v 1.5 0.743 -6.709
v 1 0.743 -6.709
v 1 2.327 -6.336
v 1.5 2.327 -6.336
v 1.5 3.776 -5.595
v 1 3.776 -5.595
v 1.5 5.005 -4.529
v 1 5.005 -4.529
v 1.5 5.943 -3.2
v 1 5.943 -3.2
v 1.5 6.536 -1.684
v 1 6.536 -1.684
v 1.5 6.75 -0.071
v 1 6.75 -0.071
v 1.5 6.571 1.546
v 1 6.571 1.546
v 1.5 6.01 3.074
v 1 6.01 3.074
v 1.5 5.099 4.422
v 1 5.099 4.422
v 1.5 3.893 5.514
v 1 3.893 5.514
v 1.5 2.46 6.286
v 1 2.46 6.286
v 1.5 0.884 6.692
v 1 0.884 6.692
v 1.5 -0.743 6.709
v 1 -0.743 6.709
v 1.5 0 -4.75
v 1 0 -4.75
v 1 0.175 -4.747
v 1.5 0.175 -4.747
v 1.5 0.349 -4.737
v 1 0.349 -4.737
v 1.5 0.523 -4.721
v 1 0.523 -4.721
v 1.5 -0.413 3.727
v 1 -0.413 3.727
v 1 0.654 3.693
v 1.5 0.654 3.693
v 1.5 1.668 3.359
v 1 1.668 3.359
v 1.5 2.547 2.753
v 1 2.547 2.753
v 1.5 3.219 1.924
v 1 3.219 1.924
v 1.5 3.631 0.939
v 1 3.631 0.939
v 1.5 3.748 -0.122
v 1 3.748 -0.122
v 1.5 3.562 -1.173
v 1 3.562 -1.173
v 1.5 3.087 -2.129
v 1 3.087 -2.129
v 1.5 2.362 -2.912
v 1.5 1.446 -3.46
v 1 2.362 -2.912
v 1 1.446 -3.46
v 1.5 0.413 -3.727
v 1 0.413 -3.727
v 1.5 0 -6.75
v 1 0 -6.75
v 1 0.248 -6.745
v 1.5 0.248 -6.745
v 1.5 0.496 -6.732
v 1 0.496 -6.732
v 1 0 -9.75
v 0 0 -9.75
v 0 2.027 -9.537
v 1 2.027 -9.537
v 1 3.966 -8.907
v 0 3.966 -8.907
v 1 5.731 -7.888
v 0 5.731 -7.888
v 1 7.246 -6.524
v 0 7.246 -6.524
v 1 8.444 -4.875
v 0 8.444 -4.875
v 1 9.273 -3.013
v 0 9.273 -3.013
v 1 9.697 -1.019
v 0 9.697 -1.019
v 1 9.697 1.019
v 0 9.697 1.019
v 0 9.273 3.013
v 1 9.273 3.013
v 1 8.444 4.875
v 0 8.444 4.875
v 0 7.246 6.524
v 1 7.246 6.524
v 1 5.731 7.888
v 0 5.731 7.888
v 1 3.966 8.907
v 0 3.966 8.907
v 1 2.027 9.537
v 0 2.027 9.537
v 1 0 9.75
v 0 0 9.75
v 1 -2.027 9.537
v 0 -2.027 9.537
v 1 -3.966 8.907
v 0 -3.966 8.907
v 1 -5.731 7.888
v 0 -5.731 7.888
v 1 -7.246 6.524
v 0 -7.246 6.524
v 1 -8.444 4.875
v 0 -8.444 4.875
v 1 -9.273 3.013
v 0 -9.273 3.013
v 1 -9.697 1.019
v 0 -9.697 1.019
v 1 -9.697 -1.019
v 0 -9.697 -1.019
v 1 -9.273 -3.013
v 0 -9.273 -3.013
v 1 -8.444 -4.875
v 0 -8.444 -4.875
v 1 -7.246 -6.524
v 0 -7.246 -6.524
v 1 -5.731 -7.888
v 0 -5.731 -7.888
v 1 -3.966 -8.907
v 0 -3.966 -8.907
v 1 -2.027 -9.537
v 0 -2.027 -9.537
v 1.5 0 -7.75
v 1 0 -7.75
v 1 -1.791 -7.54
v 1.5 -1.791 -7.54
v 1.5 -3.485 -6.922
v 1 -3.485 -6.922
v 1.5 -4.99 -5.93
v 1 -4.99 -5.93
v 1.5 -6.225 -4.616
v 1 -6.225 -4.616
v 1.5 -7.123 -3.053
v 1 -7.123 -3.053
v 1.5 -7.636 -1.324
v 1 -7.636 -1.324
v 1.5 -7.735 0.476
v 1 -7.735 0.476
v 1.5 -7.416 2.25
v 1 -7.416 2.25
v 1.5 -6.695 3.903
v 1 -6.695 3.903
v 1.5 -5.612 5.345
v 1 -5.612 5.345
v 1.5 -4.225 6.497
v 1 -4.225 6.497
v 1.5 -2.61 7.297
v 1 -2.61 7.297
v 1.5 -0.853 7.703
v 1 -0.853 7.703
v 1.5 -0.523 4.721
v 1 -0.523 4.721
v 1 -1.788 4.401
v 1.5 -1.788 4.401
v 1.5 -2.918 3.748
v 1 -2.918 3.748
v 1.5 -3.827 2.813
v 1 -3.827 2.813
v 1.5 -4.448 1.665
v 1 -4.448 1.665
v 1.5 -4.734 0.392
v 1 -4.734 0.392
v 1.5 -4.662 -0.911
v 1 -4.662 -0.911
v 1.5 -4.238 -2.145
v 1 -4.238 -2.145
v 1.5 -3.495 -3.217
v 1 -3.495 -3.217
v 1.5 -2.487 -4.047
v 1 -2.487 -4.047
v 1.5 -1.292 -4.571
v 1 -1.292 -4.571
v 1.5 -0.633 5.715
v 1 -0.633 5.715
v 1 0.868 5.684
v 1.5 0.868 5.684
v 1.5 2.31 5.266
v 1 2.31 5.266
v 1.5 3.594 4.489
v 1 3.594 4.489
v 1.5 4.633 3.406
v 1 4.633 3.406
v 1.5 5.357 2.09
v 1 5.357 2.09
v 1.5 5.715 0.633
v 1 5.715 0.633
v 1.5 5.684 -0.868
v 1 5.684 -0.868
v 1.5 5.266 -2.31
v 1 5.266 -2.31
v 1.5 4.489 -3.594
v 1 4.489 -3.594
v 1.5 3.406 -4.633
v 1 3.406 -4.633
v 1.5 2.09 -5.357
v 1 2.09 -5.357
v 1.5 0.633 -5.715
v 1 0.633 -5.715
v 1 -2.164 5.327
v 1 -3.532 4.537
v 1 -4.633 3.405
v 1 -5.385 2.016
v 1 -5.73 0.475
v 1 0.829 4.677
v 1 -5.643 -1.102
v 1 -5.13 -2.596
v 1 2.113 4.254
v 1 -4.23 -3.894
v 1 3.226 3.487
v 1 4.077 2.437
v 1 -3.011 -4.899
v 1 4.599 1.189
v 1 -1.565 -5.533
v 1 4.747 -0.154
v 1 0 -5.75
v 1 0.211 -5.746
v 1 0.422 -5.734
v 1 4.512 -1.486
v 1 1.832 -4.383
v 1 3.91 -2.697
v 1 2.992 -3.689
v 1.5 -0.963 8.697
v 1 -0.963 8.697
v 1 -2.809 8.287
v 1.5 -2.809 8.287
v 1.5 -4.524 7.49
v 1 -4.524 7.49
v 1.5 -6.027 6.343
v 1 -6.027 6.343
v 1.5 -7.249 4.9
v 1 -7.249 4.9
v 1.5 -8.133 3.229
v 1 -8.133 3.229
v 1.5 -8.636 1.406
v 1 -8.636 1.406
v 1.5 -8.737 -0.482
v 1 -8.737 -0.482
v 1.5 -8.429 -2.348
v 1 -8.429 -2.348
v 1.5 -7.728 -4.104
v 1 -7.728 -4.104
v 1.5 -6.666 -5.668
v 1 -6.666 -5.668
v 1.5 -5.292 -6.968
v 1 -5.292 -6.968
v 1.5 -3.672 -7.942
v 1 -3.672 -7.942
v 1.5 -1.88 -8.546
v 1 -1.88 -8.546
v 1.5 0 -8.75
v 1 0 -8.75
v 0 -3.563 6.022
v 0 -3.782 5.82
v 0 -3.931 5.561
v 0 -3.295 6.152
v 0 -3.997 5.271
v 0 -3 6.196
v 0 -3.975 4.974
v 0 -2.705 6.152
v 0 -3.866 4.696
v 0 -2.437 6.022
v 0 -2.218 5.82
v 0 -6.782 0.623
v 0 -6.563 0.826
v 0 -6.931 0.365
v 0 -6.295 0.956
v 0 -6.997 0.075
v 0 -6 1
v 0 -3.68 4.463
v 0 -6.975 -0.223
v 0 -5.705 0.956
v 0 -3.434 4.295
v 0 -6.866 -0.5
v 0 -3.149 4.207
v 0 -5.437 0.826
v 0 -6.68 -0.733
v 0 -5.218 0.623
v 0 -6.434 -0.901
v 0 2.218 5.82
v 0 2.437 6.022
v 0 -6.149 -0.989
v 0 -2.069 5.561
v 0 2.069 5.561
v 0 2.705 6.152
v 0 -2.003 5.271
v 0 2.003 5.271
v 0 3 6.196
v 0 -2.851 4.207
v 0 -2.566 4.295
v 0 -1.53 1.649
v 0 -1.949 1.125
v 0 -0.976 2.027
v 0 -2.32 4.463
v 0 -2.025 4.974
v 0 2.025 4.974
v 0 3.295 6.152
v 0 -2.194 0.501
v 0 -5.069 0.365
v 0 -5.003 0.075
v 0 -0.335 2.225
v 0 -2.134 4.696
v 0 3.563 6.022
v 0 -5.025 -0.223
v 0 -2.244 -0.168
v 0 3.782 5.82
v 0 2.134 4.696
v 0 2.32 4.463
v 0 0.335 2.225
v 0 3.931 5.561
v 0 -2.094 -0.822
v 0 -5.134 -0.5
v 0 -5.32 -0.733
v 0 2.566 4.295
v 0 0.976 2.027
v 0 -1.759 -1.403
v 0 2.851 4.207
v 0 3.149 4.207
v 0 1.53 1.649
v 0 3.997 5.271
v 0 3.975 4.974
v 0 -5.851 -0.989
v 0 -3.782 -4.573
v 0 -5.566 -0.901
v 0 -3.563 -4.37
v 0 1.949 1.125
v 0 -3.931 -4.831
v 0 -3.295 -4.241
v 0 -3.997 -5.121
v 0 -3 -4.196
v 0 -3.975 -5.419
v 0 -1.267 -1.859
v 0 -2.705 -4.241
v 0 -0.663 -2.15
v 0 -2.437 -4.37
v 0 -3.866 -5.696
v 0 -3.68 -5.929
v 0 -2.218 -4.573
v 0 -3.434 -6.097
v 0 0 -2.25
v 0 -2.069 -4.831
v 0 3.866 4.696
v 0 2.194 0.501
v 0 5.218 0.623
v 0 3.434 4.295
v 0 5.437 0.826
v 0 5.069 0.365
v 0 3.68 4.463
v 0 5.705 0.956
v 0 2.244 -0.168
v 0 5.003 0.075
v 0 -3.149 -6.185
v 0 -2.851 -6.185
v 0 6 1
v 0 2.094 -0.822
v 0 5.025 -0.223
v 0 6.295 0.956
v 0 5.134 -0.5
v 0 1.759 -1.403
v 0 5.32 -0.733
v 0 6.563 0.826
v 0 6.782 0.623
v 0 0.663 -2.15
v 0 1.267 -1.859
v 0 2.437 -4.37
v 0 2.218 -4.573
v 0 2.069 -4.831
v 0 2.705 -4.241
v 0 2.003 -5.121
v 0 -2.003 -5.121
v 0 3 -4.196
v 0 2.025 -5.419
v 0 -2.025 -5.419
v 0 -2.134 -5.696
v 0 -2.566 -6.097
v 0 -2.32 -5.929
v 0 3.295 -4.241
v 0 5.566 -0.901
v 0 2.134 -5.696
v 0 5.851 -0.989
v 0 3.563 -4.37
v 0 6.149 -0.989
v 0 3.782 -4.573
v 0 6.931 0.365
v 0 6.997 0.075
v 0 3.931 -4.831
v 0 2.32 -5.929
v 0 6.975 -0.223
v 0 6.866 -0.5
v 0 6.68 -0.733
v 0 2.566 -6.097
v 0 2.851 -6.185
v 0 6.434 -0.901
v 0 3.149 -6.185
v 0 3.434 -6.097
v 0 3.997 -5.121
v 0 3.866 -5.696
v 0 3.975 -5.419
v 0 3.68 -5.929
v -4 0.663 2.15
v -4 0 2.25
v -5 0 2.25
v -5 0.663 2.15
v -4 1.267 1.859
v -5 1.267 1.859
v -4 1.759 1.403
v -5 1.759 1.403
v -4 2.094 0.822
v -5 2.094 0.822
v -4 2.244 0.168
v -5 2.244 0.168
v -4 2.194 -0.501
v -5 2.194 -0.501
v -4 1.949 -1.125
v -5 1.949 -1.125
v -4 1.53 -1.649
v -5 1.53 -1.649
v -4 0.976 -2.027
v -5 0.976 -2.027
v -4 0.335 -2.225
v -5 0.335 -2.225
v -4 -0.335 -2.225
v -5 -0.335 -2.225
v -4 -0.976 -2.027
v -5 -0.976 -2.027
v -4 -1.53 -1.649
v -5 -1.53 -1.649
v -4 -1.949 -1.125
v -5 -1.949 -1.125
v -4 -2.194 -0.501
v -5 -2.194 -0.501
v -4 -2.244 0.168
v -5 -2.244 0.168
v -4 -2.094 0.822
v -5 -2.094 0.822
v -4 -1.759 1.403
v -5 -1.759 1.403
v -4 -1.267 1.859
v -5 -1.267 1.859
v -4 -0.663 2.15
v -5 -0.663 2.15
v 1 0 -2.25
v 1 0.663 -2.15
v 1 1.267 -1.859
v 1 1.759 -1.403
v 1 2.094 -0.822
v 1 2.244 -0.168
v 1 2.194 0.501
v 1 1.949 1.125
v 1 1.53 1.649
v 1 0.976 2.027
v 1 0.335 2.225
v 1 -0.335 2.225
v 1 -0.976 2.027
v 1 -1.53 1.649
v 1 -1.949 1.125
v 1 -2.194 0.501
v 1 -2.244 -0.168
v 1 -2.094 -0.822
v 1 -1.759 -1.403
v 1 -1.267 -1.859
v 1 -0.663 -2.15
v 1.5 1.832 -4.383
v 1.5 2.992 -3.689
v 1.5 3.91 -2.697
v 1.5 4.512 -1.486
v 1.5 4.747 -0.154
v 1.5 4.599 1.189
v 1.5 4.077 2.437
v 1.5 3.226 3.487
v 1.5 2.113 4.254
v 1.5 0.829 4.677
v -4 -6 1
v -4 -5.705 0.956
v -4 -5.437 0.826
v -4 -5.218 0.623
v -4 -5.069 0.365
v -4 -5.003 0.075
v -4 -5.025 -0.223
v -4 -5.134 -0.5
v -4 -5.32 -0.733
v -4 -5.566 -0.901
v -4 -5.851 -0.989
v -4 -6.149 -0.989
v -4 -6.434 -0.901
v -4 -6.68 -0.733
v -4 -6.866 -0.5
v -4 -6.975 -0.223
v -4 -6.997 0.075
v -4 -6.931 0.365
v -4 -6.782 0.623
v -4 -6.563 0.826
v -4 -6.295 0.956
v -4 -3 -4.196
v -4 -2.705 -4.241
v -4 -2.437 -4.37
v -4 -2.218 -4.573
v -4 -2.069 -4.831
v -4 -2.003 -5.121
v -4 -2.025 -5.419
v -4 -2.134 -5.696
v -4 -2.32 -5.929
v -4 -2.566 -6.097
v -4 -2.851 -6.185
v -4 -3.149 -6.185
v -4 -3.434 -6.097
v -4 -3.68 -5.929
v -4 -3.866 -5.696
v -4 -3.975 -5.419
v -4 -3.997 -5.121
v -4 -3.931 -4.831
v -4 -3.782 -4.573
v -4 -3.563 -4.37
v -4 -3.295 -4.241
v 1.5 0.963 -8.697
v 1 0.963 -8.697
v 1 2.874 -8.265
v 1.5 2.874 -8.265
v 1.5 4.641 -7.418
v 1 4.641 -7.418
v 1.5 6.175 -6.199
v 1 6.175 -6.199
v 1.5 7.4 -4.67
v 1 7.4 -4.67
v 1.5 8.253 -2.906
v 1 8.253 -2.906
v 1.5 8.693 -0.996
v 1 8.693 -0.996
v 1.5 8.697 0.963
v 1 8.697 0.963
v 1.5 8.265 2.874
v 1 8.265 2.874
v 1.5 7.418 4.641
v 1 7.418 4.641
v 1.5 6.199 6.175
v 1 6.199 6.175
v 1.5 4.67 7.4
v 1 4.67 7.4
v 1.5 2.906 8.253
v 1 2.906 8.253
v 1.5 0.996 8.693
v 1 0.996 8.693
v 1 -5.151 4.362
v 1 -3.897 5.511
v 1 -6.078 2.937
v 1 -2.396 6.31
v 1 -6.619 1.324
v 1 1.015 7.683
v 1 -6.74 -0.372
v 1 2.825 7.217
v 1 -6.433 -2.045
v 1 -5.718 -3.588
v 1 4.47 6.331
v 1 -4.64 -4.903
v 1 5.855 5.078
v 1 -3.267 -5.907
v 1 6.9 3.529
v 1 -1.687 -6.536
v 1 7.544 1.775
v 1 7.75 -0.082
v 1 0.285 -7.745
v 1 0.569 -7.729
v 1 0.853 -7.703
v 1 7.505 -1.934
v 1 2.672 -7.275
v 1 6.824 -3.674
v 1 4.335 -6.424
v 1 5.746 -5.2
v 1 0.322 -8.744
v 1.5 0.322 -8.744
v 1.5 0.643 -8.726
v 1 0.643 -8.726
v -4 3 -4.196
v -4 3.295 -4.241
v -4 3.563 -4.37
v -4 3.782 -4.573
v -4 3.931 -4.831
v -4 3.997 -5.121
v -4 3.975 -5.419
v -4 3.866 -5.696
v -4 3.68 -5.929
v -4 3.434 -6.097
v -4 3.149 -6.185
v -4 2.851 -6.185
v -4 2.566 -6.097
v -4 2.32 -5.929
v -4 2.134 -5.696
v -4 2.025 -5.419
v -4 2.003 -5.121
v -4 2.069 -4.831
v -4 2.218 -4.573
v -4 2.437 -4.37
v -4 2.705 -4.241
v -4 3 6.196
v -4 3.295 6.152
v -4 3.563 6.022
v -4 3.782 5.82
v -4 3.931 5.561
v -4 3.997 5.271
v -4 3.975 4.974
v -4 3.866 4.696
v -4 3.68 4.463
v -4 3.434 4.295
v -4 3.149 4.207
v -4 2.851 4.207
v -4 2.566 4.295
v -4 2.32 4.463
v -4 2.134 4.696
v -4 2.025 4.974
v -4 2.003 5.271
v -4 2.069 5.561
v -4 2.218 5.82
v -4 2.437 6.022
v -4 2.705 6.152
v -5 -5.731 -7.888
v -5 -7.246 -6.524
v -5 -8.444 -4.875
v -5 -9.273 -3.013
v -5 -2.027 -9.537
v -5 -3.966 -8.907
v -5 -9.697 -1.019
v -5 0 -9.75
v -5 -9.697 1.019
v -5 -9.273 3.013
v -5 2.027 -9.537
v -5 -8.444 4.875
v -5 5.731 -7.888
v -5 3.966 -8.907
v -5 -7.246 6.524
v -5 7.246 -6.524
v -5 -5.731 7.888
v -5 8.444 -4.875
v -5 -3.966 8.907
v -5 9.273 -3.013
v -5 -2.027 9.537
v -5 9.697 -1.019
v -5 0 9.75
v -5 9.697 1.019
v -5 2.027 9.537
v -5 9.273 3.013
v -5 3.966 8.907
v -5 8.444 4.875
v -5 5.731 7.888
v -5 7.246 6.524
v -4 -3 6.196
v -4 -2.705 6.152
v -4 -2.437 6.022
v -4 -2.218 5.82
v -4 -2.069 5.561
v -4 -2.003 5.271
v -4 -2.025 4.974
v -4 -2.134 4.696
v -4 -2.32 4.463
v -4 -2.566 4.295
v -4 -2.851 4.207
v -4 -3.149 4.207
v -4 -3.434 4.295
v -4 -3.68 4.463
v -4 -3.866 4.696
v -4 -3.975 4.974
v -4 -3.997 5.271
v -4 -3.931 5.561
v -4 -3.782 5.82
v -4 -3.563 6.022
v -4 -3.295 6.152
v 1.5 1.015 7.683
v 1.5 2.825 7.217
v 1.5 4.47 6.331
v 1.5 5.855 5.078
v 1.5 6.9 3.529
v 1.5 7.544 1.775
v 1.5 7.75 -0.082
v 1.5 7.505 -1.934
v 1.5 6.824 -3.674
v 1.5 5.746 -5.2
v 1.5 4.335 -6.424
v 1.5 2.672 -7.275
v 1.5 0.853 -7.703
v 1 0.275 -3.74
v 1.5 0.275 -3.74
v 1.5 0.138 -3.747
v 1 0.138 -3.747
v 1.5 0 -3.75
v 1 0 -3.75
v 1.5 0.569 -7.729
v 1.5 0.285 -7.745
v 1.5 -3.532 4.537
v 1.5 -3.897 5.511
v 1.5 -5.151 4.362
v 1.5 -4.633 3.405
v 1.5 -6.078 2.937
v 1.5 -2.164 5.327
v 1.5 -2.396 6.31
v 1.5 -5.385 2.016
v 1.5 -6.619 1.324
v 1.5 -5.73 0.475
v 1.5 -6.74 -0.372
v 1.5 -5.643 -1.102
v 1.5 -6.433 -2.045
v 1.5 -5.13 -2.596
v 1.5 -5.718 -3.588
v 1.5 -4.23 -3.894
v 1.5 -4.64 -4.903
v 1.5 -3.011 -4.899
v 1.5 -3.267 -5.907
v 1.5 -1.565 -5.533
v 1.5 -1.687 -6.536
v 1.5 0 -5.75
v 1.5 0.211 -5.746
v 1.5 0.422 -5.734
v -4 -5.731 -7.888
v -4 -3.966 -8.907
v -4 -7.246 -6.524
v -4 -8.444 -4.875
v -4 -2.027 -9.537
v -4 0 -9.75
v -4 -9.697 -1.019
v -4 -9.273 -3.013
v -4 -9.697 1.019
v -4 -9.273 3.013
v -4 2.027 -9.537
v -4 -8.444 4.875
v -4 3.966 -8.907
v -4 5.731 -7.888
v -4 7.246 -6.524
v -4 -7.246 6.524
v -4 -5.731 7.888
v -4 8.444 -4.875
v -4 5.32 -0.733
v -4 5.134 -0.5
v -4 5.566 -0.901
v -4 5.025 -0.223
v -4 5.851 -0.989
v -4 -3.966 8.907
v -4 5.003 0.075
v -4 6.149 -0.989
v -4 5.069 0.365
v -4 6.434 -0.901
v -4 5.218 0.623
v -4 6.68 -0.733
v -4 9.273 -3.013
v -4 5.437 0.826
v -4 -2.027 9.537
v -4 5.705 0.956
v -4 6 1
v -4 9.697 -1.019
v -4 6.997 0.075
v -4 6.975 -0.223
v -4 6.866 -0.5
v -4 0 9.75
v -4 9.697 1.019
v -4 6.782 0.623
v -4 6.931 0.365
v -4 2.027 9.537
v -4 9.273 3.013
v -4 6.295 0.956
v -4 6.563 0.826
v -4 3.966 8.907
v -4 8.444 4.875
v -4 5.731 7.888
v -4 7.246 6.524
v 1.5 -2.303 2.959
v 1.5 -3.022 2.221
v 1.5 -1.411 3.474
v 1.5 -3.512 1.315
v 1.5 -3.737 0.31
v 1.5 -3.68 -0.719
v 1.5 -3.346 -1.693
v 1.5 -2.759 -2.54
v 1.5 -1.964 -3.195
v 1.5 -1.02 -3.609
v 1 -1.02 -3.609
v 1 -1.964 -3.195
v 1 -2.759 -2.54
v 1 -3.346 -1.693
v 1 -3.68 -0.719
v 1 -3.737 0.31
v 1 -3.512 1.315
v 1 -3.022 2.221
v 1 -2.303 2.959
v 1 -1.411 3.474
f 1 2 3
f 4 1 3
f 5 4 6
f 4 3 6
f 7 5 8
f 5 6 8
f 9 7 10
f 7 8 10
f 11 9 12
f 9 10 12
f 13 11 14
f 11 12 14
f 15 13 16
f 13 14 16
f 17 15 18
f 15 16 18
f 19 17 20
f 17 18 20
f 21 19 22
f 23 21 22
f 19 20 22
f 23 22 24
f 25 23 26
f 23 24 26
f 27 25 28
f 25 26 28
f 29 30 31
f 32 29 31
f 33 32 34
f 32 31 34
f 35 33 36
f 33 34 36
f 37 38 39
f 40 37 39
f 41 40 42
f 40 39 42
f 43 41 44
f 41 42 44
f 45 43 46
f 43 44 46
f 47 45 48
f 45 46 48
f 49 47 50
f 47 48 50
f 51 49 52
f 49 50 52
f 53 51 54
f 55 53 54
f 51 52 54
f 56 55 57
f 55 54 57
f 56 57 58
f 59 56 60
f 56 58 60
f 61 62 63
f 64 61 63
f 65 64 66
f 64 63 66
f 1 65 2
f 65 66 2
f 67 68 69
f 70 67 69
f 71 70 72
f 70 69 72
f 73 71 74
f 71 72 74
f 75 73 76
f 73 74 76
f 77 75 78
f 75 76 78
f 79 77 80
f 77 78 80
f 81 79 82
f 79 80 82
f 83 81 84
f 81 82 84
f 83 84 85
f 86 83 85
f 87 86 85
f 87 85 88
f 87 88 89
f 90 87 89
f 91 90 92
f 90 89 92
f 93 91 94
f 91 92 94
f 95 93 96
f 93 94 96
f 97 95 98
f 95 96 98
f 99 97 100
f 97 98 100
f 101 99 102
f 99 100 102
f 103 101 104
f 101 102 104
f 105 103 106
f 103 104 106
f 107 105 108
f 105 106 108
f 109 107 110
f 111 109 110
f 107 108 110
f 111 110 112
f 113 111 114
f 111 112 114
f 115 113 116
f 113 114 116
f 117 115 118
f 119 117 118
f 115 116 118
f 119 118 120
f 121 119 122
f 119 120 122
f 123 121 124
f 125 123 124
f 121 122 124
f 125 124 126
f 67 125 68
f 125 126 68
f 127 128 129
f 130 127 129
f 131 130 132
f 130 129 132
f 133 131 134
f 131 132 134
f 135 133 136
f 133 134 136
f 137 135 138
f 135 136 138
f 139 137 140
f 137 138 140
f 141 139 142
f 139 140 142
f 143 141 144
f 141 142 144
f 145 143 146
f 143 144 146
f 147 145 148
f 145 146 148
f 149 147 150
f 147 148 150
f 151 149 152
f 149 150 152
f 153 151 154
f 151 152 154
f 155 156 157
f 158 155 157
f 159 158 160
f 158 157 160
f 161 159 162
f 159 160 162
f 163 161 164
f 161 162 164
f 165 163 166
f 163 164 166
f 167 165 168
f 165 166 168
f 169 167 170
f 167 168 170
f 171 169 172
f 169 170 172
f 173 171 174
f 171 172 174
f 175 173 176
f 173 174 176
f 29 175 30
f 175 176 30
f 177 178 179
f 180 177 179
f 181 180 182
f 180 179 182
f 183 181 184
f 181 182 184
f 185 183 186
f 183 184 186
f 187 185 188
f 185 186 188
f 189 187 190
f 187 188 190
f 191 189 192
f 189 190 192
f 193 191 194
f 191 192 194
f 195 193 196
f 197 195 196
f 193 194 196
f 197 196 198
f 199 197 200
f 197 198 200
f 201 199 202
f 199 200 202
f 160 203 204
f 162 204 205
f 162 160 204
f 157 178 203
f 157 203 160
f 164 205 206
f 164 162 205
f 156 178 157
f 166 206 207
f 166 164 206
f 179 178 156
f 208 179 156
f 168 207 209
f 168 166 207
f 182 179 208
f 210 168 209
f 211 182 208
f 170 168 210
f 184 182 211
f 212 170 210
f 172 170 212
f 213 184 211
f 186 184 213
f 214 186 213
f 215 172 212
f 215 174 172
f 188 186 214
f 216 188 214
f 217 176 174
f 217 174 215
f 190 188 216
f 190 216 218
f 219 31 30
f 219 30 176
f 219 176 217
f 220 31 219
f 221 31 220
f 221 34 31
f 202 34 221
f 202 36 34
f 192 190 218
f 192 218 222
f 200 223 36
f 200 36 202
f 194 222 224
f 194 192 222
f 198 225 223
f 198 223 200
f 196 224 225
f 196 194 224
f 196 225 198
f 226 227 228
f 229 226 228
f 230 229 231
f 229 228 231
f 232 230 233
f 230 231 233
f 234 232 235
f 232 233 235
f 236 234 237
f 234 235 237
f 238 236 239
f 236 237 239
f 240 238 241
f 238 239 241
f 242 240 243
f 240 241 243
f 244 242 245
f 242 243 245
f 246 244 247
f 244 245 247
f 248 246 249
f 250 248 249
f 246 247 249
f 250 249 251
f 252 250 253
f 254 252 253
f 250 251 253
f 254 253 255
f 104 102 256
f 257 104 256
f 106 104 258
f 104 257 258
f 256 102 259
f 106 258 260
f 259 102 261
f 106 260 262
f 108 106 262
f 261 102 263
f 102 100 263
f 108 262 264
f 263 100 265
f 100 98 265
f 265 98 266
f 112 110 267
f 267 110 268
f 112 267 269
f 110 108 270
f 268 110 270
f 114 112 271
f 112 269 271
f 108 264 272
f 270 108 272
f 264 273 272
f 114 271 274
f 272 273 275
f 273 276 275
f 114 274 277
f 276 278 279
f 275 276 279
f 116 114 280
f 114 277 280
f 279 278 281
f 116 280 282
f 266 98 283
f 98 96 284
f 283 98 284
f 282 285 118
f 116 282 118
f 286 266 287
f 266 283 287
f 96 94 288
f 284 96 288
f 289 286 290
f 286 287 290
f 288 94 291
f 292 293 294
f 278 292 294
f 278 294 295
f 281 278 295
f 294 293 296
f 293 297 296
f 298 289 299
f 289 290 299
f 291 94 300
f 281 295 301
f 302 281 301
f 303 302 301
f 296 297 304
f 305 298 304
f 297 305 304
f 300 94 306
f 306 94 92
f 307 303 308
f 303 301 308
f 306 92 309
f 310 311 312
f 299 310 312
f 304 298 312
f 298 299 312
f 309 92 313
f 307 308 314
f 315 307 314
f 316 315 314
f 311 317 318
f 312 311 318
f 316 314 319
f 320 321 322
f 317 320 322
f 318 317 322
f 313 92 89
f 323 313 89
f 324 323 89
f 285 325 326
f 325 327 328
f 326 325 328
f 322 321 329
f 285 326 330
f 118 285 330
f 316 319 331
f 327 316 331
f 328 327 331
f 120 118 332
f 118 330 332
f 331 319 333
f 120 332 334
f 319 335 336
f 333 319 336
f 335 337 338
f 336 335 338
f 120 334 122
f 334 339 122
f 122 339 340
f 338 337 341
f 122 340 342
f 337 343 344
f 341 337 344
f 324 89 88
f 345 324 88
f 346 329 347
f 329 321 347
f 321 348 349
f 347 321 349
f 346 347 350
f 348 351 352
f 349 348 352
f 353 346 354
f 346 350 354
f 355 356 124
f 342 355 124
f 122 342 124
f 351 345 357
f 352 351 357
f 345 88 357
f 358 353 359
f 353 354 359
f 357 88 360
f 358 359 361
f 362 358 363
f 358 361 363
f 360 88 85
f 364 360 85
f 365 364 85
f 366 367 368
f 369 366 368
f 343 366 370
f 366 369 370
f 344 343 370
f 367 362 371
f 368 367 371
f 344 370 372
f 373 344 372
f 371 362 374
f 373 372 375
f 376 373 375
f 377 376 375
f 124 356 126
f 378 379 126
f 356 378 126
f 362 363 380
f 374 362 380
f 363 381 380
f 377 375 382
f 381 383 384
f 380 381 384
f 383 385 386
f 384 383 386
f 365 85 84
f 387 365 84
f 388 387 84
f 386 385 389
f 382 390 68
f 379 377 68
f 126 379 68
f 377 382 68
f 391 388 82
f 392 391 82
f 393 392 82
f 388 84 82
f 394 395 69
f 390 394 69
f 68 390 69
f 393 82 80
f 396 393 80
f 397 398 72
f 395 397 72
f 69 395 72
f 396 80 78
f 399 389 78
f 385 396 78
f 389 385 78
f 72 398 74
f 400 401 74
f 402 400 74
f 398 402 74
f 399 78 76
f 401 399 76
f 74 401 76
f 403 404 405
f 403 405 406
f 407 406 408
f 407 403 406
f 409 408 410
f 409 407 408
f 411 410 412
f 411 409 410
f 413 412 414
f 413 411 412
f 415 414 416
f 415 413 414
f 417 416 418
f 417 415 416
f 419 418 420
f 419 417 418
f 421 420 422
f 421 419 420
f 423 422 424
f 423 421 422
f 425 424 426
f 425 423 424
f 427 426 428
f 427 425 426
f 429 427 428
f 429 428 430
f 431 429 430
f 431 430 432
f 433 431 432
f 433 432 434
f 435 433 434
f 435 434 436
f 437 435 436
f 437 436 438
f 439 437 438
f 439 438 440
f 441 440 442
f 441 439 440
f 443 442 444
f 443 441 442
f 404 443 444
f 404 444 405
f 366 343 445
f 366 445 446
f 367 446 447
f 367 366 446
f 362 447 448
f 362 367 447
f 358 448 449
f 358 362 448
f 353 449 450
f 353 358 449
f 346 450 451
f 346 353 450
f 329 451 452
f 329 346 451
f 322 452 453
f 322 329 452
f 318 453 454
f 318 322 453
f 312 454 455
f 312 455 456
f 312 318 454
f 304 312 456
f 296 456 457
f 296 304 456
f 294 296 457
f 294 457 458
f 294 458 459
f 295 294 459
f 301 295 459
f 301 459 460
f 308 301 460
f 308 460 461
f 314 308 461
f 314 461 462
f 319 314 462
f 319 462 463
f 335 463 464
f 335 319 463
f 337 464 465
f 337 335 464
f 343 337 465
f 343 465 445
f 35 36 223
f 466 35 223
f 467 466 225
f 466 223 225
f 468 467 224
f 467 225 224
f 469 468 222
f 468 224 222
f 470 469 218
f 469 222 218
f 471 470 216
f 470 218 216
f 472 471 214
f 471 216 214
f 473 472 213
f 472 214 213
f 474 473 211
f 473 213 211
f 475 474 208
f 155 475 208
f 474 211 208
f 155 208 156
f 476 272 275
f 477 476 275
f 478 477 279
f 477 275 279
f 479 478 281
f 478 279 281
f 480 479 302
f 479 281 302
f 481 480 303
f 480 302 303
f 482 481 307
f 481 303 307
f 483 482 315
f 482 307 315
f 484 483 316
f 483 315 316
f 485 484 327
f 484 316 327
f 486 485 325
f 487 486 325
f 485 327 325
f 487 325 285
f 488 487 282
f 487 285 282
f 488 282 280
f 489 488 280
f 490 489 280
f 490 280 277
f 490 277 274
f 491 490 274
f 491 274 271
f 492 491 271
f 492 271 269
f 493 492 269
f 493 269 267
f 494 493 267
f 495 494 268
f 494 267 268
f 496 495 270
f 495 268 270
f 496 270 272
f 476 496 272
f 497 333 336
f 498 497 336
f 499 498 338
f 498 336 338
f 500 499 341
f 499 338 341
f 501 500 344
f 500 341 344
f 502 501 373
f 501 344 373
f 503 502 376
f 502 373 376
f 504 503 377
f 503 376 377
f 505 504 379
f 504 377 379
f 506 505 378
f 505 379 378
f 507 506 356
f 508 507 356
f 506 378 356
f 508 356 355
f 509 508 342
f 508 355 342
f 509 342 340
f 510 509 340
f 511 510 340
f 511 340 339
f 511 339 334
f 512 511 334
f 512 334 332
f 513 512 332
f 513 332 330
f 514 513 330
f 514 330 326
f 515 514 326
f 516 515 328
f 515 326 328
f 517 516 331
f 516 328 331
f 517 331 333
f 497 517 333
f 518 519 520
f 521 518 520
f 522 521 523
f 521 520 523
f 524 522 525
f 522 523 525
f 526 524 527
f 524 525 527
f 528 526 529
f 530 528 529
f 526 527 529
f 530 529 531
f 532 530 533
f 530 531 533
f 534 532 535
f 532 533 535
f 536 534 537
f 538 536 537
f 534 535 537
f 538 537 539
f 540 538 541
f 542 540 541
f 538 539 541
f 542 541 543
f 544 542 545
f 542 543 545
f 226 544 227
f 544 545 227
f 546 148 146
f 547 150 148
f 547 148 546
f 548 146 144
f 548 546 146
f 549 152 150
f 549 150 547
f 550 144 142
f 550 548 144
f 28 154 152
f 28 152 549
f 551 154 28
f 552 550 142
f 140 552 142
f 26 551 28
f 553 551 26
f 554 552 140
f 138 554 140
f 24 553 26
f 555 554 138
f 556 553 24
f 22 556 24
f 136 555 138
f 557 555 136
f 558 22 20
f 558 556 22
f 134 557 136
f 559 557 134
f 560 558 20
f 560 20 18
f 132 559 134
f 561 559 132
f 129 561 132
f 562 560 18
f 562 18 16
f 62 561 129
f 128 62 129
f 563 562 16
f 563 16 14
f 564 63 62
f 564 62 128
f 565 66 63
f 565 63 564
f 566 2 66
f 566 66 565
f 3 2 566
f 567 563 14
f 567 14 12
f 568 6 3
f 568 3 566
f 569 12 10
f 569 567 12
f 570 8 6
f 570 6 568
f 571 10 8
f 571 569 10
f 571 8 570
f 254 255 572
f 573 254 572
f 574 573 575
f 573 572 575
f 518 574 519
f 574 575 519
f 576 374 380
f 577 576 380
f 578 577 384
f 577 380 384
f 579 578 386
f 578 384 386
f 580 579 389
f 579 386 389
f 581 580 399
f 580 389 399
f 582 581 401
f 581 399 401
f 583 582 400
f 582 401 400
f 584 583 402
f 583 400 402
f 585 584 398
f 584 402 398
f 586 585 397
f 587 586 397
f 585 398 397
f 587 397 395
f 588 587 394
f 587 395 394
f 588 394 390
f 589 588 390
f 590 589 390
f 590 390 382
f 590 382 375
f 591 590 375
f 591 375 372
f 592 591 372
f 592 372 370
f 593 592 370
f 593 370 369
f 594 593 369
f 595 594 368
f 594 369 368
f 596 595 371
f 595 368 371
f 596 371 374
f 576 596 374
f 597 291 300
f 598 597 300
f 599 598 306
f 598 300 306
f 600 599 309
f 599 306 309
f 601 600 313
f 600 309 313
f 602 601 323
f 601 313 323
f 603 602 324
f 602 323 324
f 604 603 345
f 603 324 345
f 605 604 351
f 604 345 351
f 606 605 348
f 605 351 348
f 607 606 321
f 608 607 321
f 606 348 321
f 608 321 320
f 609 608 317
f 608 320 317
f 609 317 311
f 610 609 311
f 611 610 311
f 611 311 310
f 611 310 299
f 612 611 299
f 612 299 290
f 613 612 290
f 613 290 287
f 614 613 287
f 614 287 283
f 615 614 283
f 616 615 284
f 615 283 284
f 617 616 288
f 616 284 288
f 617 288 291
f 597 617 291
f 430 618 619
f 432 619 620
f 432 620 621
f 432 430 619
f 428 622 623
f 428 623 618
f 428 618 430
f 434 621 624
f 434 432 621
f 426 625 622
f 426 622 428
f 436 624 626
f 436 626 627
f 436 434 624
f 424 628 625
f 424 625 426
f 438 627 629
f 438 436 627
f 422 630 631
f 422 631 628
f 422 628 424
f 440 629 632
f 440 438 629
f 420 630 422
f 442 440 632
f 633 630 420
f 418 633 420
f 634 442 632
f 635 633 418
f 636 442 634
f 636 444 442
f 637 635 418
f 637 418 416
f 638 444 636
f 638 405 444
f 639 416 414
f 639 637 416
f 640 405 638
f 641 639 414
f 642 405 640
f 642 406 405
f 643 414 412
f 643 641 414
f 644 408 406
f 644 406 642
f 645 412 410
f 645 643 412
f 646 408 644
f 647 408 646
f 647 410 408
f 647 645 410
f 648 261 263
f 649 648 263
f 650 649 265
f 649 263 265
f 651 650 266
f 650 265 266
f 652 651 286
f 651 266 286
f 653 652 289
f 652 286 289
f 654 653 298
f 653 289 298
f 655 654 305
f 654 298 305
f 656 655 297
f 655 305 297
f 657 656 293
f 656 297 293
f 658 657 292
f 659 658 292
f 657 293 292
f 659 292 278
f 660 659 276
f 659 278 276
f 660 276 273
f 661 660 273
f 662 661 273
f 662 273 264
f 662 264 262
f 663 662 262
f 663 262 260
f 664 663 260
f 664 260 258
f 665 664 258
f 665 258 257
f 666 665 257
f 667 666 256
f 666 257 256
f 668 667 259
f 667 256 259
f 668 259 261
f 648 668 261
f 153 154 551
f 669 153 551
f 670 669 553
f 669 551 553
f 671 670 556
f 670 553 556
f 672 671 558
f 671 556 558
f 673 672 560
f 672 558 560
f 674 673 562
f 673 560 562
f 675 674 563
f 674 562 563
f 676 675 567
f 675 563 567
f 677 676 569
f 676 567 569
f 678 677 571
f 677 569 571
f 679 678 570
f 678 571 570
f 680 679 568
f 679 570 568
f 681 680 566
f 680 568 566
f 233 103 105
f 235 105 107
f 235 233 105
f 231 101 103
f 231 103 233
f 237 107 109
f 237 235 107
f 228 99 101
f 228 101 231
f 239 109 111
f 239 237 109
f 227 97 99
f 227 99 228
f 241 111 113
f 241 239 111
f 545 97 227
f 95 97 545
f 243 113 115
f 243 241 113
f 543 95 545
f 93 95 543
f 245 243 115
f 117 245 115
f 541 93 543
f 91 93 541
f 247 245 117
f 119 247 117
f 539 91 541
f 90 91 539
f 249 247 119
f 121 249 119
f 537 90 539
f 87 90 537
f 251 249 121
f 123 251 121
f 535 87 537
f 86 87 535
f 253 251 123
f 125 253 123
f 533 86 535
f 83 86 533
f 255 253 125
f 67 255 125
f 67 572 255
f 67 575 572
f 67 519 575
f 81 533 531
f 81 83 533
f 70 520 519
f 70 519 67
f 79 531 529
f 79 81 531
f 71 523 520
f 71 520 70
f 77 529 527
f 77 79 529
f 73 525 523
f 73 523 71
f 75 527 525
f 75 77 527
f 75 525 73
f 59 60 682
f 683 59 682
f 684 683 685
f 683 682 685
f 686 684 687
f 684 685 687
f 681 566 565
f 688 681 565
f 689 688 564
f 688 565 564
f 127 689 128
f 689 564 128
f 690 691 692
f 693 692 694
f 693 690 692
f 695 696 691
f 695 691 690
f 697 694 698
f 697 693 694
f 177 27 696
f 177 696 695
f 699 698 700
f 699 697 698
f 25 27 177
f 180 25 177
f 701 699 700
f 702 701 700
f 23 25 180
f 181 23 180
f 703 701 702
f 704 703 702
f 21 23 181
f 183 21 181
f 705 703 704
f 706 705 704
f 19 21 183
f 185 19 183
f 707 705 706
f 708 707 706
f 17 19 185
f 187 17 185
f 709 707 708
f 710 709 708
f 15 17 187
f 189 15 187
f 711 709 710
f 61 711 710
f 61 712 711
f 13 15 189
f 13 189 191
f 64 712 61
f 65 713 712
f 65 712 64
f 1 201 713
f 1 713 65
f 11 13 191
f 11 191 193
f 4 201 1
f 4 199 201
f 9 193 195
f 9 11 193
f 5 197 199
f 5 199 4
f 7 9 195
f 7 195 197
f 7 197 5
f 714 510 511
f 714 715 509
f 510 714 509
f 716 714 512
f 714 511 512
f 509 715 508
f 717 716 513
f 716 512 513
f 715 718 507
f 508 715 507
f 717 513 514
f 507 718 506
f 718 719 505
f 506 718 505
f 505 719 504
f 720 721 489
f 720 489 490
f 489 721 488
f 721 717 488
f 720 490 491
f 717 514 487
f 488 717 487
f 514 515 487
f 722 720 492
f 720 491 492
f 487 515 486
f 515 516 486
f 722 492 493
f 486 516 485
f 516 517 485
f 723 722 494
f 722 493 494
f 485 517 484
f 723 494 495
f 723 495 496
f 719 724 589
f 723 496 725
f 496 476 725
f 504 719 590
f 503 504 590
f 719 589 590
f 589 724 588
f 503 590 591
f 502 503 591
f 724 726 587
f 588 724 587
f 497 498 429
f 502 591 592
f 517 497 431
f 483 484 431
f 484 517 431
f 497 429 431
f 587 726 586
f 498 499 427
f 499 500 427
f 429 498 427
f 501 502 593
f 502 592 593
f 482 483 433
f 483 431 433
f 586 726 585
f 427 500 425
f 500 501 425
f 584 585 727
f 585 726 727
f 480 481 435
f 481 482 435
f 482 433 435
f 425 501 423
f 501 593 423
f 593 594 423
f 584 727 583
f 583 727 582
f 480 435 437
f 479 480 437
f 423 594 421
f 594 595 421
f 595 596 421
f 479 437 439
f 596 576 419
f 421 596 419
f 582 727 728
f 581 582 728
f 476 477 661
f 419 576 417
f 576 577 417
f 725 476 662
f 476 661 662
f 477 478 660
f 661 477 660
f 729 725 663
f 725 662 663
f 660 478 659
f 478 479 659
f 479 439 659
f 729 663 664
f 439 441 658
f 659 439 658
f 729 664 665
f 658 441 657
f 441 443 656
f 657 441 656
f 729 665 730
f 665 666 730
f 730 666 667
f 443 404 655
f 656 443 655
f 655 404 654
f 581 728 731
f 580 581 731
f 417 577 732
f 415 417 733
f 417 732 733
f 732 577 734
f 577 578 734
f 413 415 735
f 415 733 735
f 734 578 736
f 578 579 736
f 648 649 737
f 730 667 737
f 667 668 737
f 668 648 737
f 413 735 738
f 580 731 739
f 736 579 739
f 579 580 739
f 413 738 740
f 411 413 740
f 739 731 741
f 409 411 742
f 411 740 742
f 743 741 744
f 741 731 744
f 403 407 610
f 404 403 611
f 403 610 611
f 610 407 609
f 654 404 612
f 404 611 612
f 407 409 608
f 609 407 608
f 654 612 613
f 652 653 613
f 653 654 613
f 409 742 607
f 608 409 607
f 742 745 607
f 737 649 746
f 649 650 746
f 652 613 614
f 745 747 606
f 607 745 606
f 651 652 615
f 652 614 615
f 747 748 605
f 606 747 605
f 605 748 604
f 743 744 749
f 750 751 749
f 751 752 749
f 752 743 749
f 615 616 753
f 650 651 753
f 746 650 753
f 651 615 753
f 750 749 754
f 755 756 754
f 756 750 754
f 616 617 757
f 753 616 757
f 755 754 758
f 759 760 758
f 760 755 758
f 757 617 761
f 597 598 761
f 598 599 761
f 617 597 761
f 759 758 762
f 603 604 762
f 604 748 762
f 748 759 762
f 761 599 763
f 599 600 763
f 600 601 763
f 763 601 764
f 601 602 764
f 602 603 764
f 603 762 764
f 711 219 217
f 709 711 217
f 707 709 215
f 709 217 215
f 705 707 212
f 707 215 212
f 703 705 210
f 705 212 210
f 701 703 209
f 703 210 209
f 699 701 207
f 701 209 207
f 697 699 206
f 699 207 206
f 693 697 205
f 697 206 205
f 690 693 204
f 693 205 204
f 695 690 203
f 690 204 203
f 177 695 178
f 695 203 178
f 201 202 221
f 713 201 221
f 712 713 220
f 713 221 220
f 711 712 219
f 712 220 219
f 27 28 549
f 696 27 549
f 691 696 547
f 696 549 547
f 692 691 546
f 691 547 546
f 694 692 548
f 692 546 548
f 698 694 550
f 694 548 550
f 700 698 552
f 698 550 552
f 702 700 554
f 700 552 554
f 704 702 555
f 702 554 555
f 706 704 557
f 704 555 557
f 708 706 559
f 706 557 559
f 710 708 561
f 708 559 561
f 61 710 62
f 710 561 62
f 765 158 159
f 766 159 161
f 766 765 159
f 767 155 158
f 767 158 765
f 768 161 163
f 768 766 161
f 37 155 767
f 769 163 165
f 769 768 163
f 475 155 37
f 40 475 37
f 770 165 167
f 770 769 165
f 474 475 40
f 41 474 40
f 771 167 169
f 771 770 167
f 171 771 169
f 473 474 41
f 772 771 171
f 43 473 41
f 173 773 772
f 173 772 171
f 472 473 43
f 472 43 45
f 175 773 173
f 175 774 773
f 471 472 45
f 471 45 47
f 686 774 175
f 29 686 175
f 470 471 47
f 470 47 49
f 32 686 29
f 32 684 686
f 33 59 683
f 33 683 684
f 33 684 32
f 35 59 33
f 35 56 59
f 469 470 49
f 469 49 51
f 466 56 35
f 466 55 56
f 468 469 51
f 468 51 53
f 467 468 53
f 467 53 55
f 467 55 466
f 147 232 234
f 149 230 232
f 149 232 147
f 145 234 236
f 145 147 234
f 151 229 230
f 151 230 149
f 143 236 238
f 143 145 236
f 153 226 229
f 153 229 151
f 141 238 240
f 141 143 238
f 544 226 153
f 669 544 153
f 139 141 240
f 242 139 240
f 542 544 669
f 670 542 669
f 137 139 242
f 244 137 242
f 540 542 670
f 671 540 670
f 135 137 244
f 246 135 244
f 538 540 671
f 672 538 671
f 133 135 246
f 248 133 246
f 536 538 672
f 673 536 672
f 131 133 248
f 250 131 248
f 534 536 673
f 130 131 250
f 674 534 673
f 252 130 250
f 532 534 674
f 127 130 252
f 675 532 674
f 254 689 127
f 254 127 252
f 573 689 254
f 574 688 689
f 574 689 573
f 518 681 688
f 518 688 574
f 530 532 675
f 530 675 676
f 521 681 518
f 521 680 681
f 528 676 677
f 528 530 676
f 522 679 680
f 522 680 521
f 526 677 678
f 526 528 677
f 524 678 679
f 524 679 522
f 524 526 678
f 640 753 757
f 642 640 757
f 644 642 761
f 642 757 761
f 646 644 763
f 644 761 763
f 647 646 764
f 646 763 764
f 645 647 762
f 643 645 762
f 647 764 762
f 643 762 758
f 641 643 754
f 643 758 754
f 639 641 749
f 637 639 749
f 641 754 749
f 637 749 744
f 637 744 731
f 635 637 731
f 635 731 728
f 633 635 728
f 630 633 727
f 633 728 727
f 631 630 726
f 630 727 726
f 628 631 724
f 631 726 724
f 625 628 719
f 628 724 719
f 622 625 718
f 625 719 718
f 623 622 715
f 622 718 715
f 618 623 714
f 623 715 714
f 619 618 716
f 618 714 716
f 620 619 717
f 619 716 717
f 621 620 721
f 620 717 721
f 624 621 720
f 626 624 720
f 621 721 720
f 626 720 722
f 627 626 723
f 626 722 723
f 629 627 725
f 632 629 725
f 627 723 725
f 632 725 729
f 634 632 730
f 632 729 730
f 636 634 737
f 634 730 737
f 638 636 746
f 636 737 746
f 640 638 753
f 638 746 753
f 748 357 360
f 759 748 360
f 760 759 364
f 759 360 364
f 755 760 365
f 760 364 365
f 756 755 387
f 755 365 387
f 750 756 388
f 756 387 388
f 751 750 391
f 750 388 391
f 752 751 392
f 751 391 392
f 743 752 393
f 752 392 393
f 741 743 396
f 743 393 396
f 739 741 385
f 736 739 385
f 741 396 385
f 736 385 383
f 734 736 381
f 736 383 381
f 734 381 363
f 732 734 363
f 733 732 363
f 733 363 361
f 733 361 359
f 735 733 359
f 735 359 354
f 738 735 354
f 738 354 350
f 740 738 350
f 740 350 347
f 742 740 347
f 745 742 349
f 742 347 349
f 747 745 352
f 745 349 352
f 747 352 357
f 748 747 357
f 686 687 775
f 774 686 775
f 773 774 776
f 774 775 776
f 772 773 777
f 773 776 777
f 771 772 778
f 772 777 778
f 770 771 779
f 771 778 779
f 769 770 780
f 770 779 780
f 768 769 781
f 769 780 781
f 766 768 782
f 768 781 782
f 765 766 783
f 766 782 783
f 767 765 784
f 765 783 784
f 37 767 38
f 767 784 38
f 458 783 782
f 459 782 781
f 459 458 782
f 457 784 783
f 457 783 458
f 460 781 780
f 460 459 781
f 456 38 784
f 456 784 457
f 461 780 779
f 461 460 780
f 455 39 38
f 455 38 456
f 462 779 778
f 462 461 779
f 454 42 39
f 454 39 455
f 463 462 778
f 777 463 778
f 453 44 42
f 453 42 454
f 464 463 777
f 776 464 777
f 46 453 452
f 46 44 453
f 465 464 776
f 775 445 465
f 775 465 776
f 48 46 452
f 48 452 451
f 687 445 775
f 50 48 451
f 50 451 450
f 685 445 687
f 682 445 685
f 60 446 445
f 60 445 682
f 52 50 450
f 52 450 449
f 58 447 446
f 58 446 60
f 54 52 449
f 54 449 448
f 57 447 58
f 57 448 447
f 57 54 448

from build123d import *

# Parameters (mm, degrees)
SKETCH1_R           = 9.75
SKETCH1_R_2         = 2.25
BOSS_EXTRUDE1_DEPTH = 1
BOSS_EXTRUDE2_DEPTH = 0.5
SKETCH3_R           = 1
BOSS_EXTRUDE3_DEPTH = 4
SKETCH4_R           = 9.75
SKETCH4_R_2         = 2.25
BOSS_EXTRUDE4_DEPTH = 1


with BuildPart() as part:
    # Sketch1 → Boss-Extrude1 (new body)
    with BuildSketch(Plane(origin=(0, 0, 0), x_dir=(0, 0, -1), z_dir=(1, 0, 0))):
        Circle(SKETCH1_R)
        Circle(SKETCH1_R_2, mode=Mode.SUBTRACT)
    extrude(amount=BOSS_EXTRUDE1_DEPTH)

    # Sketch2 → Boss-Extrude2 (add)
    with BuildSketch(Plane(origin=(1, 0, 0), x_dir=(0, 0, -1), z_dir=(1, 0, 0))):
        with BuildLine():
            ThreePointArc((8.696853314, 0.96293428), (-0.96293428, 8.696853314), (-8.696853314, -0.96293428))
            ThreePointArc((-8.696853314, -0.96293428), (0.482199906, -8.736703226), (8.75, 0))
            ThreePointArc((8.75, 0), (8.736703226, 0.482199906), (8.696853314, 0.96293428))
        make_face()
        with BuildLine():
            ThreePointArc((7.75, 0), (0.427091345, -7.738222857), (-7.702927221, -0.852884648))
            ThreePointArc((-7.702927221, -0.852884648), (-0.852884648, 7.702927221), (7.702927221, 0.852884648))
            ThreePointArc((7.702927221, 0.852884648), (7.738222857, 0.427091345), (7.75, 0))
        make_face(mode=Mode.SUBTRACT)
        with BuildLine():
            ThreePointArc((6.709001128, 0.742835016), (-0.742835016, 6.709001128), (-6.709001128, -0.742835016))
            ThreePointArc((-6.709001128, -0.742835016), (0.371982785, -6.739742488), (6.75, 0))
            ThreePointArc((6.75, 0), (6.739742488, 0.371982785), (6.709001128, 0.742835016))
        make_face()
        with BuildLine():
            ThreePointArc((5.75, 0), (0.316874224, -5.74126212), (-5.715075035, -0.632785384))
            ThreePointArc((-5.715075035, -0.632785384), (-0.632785384, 5.715075035), (5.715075035, 0.632785384))
            ThreePointArc((5.715075035, 0.632785384), (5.74126212, 0.316874224), (5.75, 0))
        make_face(mode=Mode.SUBTRACT)
        with BuildLine():
            ThreePointArc((4.721148942, 0.522735752), (-0.522735752, 4.721148942), (-4.721148942, -0.522735752))
            ThreePointArc((-4.721148942, -0.522735752), (0.261765663, -4.742781751), (4.75, 0))
            ThreePointArc((4.75, 0), (4.742781751, 0.261765663), (4.721148942, 0.522735752))
        make_face()
        with BuildLine():
            ThreePointArc((3.75, 0), (0.206657103, -3.744301382), (-3.727222849, -0.41268612))
            ThreePointArc((-3.727222849, -0.41268612), (-0.41268612, 3.727222849), (3.727222849, 0.41268612))
            ThreePointArc((3.727222849, 0.41268612), (3.744301382, 0.206657103), (3.75, 0))
        make_face(mode=Mode.SUBTRACT)
    extrude(amount=BOSS_EXTRUDE2_DEPTH)

    # Sketch3 → Boss-Extrude3 (add)
    with BuildSketch(Plane.ZY):
        with Locations((0, 6)):
            Circle(SKETCH3_R)
        with Locations((5.196152423, 3)):
            Circle(SKETCH3_R)
        with Locations((5.196152423, -3)):
            Circle(SKETCH3_R)
        with Locations((0, -6)):
            Circle(SKETCH3_R)
        with Locations((-5.196152423, -3)):
            Circle(SKETCH3_R)
        with Locations((-5.196152423, 3)):
            Circle(SKETCH3_R)
    extrude(amount=BOSS_EXTRUDE3_DEPTH)

    # Sketch4 → Boss-Extrude4 (add)
    with BuildSketch(Plane.ZY.offset(4)):
        Circle(SKETCH4_R)
        Circle(SKETCH4_R_2, mode=Mode.SUBTRACT)
    extrude(amount=BOSS_EXTRUDE4_DEPTH)


solid = part.part
